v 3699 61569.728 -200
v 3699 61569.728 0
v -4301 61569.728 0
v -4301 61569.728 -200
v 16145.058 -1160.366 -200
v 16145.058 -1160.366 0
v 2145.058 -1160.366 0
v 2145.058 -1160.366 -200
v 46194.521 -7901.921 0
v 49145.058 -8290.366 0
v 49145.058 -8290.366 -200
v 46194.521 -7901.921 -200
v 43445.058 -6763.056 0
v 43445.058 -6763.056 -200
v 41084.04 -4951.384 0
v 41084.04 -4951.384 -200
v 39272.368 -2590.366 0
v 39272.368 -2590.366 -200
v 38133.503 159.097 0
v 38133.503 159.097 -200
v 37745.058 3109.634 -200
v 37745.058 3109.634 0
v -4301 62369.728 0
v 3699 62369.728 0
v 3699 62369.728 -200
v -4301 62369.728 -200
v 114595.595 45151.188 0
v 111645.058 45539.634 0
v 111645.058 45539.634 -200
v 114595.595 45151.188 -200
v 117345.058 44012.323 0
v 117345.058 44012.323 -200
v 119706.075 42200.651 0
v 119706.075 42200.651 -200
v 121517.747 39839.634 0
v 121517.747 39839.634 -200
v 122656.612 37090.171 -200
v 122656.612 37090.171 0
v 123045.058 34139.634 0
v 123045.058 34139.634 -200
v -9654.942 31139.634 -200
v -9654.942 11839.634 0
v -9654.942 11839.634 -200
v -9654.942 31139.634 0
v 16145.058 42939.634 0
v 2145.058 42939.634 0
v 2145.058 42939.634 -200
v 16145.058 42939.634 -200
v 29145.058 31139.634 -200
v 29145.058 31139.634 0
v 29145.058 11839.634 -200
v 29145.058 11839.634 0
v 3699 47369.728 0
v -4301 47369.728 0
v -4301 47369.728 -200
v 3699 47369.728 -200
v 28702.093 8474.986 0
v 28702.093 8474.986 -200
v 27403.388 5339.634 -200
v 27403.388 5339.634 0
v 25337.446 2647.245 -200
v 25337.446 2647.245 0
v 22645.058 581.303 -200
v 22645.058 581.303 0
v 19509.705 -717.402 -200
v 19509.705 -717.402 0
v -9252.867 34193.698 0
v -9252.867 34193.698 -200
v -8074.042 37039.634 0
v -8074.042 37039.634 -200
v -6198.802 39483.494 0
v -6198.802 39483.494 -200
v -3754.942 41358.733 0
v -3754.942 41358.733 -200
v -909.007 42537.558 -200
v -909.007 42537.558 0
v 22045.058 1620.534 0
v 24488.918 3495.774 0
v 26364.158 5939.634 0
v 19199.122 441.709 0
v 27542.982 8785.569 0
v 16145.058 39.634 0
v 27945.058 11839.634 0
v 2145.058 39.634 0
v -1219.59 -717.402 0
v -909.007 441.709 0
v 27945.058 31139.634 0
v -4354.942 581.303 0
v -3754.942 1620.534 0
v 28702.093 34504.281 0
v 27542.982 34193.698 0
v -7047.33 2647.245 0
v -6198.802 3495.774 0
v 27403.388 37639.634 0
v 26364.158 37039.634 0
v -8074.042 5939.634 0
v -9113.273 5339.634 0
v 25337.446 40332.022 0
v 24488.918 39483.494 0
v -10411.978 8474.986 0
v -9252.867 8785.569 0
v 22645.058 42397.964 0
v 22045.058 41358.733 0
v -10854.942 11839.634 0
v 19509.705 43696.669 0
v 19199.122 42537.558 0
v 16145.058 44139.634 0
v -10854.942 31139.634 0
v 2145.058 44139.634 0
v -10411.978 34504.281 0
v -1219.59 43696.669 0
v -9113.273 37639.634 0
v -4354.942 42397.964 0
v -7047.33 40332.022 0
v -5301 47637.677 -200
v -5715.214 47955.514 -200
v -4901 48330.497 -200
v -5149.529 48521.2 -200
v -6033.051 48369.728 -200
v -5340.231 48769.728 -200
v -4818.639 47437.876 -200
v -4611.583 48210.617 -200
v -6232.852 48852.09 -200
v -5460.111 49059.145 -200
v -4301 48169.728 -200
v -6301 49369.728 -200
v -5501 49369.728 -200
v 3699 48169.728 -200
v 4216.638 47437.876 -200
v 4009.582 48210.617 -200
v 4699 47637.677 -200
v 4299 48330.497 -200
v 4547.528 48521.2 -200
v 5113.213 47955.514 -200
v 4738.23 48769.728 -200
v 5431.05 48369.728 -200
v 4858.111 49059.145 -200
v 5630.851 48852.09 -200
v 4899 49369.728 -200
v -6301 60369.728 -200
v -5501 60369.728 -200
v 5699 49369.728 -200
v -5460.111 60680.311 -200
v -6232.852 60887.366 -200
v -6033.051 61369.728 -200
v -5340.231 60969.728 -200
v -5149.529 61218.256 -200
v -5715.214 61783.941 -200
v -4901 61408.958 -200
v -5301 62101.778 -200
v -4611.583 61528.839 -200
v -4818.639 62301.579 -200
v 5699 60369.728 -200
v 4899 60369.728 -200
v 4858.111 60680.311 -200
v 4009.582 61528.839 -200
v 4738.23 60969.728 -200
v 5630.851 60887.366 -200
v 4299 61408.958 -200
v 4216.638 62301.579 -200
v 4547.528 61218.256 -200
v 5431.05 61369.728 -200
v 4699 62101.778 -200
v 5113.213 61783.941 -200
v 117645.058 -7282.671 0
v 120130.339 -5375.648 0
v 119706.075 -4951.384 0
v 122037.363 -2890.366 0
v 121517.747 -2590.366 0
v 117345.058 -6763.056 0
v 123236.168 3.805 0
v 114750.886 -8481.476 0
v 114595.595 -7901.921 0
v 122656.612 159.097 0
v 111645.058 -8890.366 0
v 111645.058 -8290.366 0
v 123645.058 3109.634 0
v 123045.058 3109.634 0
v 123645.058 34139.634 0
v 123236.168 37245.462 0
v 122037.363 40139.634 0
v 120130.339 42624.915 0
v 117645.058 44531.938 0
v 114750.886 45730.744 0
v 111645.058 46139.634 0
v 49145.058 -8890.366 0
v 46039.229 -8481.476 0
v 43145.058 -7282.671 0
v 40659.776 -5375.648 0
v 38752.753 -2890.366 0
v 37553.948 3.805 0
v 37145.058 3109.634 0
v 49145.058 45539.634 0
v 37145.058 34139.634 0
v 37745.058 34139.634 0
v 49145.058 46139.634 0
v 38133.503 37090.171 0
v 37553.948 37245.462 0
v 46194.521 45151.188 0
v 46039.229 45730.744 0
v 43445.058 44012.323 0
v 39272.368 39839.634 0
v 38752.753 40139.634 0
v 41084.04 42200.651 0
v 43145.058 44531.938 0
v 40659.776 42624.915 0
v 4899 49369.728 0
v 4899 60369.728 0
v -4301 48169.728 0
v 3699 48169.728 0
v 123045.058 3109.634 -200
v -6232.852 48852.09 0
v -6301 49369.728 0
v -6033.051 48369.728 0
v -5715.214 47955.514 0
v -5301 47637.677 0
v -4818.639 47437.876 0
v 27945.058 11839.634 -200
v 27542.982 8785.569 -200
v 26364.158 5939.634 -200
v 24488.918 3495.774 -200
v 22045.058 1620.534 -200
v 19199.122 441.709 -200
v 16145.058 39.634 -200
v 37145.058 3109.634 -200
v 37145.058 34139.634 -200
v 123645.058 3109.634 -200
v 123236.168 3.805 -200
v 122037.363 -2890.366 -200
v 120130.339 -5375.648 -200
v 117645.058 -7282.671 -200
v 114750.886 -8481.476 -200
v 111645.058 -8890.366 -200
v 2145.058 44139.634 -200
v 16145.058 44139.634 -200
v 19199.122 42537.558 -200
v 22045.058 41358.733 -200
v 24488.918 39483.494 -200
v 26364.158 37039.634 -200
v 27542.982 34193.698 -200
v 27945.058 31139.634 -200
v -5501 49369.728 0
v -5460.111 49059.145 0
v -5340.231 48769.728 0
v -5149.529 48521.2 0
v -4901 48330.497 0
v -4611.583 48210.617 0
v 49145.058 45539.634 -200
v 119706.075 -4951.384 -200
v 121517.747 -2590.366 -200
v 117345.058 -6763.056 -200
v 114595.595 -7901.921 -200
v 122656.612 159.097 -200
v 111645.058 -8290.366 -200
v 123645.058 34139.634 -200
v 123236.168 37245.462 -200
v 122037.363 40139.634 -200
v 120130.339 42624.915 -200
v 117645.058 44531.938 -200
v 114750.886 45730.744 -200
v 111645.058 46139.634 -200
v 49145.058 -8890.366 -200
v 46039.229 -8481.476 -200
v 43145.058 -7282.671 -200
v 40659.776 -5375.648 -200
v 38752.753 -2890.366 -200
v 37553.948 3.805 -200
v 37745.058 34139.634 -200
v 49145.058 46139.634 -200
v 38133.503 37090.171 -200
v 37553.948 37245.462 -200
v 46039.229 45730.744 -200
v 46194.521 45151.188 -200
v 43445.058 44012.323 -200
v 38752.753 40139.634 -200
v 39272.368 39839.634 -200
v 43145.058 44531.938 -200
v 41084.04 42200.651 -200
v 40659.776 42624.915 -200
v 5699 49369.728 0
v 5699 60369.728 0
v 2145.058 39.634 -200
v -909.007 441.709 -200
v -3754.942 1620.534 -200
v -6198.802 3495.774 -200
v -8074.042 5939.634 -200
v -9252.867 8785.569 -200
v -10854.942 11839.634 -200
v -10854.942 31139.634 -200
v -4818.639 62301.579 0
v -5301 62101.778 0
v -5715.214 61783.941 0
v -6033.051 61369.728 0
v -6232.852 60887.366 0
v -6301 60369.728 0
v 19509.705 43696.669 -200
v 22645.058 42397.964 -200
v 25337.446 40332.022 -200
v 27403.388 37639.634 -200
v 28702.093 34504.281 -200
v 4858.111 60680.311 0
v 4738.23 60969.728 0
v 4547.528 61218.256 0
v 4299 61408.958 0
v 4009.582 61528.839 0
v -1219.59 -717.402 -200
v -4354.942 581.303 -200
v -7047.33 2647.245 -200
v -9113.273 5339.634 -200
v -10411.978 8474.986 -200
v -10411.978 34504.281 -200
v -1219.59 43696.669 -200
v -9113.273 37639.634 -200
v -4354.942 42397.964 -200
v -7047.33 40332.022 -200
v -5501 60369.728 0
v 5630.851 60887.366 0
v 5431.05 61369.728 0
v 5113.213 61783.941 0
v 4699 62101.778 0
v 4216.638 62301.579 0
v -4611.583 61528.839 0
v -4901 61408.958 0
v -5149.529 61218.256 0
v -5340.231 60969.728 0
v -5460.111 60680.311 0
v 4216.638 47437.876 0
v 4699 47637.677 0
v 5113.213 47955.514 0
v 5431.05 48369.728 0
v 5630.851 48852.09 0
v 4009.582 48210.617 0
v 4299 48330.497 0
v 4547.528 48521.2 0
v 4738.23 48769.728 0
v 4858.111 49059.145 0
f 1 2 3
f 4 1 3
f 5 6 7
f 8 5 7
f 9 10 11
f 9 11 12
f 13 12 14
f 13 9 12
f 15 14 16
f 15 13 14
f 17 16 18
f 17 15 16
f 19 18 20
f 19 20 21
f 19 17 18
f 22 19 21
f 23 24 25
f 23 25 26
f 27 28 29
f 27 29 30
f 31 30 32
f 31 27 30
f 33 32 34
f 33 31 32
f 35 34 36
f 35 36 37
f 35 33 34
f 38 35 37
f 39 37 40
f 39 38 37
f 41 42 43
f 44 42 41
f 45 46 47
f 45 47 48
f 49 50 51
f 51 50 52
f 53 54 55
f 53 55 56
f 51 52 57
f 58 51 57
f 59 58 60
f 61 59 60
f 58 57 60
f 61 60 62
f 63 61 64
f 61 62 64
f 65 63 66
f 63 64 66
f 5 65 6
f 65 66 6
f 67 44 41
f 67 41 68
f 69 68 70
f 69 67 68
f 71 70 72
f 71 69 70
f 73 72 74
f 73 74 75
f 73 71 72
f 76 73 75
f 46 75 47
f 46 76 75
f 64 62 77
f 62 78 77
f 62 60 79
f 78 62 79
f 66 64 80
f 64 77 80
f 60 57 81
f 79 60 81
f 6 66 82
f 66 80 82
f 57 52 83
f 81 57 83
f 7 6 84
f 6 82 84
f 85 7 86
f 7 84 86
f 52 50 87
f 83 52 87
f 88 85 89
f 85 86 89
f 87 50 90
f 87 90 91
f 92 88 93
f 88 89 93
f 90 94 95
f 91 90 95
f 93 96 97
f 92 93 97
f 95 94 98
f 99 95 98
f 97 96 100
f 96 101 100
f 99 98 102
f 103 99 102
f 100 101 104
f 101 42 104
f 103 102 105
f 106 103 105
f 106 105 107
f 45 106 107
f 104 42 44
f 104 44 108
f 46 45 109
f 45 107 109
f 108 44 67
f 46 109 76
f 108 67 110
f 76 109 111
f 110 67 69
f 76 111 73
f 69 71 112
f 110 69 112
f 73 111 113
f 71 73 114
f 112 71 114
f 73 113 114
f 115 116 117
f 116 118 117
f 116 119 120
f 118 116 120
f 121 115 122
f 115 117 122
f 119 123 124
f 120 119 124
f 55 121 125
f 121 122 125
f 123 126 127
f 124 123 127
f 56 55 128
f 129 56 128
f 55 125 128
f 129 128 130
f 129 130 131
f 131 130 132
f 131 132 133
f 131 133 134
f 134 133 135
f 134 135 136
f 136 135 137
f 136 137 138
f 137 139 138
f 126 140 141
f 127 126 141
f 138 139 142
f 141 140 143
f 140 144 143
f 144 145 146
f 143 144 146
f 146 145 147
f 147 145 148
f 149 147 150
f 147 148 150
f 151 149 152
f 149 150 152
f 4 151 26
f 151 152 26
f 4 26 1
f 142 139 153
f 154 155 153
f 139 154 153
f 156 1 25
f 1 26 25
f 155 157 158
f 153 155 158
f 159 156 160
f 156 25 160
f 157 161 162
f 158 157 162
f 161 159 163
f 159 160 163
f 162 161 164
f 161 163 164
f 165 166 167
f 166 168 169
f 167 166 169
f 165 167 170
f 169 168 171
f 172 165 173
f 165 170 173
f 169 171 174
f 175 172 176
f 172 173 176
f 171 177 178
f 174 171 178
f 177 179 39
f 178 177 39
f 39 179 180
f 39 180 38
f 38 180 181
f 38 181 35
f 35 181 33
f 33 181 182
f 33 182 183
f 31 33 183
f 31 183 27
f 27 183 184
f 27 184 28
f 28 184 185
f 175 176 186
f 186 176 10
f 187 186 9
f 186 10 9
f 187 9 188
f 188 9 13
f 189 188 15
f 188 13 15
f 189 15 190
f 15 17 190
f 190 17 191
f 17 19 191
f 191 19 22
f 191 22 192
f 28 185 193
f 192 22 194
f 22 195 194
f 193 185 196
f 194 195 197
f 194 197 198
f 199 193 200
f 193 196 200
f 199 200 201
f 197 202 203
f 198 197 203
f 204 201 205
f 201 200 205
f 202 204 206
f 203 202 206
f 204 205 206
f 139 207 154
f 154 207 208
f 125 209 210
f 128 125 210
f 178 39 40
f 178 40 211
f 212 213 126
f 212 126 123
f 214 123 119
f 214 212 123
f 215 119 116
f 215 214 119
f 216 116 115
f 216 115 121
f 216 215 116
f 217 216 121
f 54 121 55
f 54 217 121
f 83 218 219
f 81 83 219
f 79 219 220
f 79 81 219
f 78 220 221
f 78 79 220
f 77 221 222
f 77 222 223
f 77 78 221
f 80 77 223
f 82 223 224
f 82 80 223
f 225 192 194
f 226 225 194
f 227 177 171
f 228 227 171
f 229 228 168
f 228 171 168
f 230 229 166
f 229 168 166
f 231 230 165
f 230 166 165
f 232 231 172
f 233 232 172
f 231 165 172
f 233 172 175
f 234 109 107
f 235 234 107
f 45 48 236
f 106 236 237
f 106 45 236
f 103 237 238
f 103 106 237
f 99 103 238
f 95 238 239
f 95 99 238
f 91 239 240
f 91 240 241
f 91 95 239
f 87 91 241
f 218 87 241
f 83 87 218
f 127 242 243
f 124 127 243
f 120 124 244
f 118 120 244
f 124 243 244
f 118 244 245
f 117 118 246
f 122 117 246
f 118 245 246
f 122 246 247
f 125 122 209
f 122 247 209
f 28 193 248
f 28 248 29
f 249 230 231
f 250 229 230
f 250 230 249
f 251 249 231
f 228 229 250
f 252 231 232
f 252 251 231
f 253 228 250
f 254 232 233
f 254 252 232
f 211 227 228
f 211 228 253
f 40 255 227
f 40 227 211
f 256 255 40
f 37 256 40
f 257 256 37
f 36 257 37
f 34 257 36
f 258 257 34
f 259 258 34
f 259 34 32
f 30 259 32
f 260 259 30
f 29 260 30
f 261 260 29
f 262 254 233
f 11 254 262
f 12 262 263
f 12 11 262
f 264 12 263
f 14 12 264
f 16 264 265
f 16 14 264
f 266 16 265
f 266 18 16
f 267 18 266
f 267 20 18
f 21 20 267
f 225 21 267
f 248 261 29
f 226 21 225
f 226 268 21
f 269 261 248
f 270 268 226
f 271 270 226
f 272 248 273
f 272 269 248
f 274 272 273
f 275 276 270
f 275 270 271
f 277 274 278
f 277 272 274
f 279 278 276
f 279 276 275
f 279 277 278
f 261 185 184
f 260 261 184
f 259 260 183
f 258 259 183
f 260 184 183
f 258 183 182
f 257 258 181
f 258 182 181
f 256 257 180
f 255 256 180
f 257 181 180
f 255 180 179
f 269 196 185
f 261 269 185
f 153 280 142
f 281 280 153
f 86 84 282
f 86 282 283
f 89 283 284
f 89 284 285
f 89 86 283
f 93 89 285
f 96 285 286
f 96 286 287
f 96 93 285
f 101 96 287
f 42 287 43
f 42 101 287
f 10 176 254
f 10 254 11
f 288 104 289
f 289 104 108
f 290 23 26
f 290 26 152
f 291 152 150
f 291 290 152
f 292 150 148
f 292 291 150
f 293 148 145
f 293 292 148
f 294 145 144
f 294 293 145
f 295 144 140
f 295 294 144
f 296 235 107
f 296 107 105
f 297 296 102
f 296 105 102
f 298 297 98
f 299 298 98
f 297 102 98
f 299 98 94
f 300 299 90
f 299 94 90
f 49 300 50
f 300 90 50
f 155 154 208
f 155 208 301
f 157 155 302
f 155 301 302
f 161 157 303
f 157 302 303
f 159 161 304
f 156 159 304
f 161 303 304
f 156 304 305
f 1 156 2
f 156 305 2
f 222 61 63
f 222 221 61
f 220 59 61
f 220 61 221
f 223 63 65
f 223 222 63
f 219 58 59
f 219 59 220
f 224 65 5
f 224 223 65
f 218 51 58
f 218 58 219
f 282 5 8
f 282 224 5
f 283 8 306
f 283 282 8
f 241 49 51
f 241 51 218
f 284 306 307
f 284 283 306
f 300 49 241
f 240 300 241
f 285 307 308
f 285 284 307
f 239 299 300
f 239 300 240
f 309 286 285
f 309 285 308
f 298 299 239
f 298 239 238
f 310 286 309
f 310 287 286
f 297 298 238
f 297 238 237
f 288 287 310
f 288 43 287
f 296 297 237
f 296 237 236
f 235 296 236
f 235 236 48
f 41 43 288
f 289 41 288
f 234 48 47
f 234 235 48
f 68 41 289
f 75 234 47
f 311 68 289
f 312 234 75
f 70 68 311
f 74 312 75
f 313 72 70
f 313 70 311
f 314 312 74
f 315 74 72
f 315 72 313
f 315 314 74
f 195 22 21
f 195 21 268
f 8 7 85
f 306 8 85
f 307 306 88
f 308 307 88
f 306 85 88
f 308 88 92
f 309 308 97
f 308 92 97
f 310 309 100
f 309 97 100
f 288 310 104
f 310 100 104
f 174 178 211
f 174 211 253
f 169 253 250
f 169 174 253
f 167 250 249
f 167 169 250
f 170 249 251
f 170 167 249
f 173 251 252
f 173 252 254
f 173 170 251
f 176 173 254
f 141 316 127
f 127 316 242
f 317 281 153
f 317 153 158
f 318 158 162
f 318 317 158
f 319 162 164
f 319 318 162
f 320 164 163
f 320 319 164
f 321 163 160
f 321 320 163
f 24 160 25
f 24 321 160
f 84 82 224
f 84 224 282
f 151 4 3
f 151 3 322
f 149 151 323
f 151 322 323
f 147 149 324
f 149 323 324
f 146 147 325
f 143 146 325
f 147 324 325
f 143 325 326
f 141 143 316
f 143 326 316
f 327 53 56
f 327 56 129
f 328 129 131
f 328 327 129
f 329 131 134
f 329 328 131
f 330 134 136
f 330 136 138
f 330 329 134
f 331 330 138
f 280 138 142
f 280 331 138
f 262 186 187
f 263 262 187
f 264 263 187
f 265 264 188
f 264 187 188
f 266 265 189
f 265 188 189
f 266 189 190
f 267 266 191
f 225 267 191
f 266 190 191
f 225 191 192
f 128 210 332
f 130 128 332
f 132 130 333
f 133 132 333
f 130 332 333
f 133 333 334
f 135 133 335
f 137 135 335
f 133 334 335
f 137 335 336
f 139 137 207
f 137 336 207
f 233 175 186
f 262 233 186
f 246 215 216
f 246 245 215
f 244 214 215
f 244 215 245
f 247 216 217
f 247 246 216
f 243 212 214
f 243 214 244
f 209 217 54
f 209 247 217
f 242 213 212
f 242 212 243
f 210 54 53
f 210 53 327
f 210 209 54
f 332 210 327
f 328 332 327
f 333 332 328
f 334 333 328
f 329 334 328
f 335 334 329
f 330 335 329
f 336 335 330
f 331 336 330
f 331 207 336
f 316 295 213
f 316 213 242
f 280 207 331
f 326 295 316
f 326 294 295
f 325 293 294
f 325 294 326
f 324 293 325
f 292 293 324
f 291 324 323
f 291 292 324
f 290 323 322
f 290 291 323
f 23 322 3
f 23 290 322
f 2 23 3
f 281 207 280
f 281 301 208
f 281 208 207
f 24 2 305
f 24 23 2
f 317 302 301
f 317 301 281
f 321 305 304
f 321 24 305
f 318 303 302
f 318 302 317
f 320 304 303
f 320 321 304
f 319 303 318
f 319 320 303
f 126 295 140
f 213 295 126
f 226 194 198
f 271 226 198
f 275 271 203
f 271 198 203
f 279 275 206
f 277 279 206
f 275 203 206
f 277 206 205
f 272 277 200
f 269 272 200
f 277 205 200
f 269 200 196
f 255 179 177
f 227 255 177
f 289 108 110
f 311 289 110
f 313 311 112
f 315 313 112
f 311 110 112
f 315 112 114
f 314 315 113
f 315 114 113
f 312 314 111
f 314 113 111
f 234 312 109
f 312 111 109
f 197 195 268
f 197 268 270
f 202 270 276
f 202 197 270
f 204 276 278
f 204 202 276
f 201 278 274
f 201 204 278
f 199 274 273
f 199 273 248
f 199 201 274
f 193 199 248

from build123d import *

# Parameters (mm, degrees)
EXTRUDE1_DEPTH   = 200
EXTRUDE1_2_DEPTH = 200
EXTRUDE1_3_DEPTH = 200


with BuildPart() as part:
    # Sketch1 → Extrude1 (new body)
    with BuildSketch(Plane.XY):
        with BuildLine():
            Line((49145.057737679, 46139.633625626), (111645.057737679, 46139.633625626))
            ThreePointArc((111645.057737679, 46139.633625626), (120130.339111917, 42624.914999864), (123645.057737679, 34139.633625626))
            Line((123645.057737679, 34139.633625626), (123645.057737679, 3109.633625626))
            ThreePointArc((123645.057737679, 3109.633625626), (120130.339111917, -5375.647748613), (111645.057737679, -8890.366374374))
            Line((111645.057737679, -8890.366374374), (49145.057737679, -8890.366374374))
            ThreePointArc((49145.057737679, -8890.366374374), (40659.77636344, -5375.647748613), (37145.057737679, 3109.633625626))
            Line((37145.057737679, 3109.633625626), (37145.057737679, 34139.633625626))
            ThreePointArc((37145.057737679, 34139.633625626), (40659.77636344, 42624.914999864), (49145.057737679, 46139.633625626))
        make_face()
        with BuildLine():
            Line((123045.057737679, 34139.633625626), (123045.057737679, 3109.633625626))
            ThreePointArc((123045.057737679, 3109.633625626), (119706.075043205, -4951.383679901), (111645.057737679, -8290.366374374))
            Line((111645.057737679, -8290.366374374), (49145.057737679, -8290.366374374))
            ThreePointArc((49145.057737679, -8290.366374374), (41084.040432152, -4951.383679901), (37745.057737679, 3109.633625626))
            Line((37745.057737679, 3109.633625626), (37745.057737679, 34139.633625626))
            ThreePointArc((37745.057737679, 34139.633625626), (41084.040432152, 42200.650931152), (49145.057737679, 45539.633625626))
            Line((49145.057737679, 45539.633625626), (111645.057737679, 45539.633625626))
            ThreePointArc((111645.057737679, 45539.633625626), (119706.075043205, 42200.650931152), (123045.057737679, 34139.633625626))
        make_face(mode=Mode.SUBTRACT)
    extrude(amount=-EXTRUDE1_DEPTH)


with BuildPart() as body_2:
    # Sketch1 → Extrude1 2 (new body)
    with BuildSketch(Plane.XY):
        with BuildLine():
            Line((2145.057737679, 44139.633625626), (16145.057737679, 44139.633625626))
            ThreePointArc((16145.057737679, 44139.633625626), (25337.445893104, 40332.021781051), (29145.057737679, 31139.633625626))
            Line((29145.057737679, 31139.633625626), (29145.057737679, 11839.633625626))
            ThreePointArc((29145.057737679, 11839.633625626), (25337.445893104, 2647.245470201), (16145.057737679, -1160.366374374))
            Line((16145.057737679, -1160.366374374), (2145.057737679, -1160.366374374))
            ThreePointArc((2145.057737679, -1160.366374374), (-7047.330417747, 2647.245470201), (-10854.942262321, 11839.633625626))
            Line((-10854.942262321, 11839.633625626), (-10854.942262321, 31139.633625626))
            ThreePointArc((-10854.942262321, 31139.633625626), (-7047.330417747, 40332.021781051), (2145.057737679, 44139.633625626))
        make_face()
        with BuildLine():
            Line((27945.057737679, 31139.633625626), (27945.057737679, 11839.633625626))
            ThreePointArc((27945.057737679, 11839.633625626), (24488.91775568, 3495.773607624), (16145.057737679, 39.633625626))
            Line((16145.057737679, 39.633625626), (2145.057737679, 39.633625626))
            ThreePointArc((2145.057737679, 39.633625626), (-6198.802280323, 3495.773607624), (-9654.942262321, 11839.633625626))
            Line((-9654.942262321, 11839.633625626), (-9654.942262321, 31139.633625626))
            ThreePointArc((-9654.942262321, 31139.633625626), (-6198.802280323, 39483.493643627), (2145.057737679, 42939.633625626))
            Line((2145.057737679, 42939.633625626), (16145.057737679, 42939.633625626))
            ThreePointArc((16145.057737679, 42939.633625626), (24488.91775568, 39483.493643627), (27945.057737679, 31139.633625626))
        make_face(mode=Mode.SUBTRACT)
    extrude(amount=-EXTRUDE1_2_DEPTH)


with BuildPart() as body_3:
    # Sketch1 → Extrude1 3 (new body)
    with BuildSketch(Plane.XY):
        with BuildLine():
            Line((3698.999542599, 62369.727650707), (-4301.000457401, 62369.727650707))
            ThreePointArc((-4301.000457401, 62369.727650707), (-5715.214019774, 61783.941213081), (-6301.000457401, 60369.727650707))
            Line((-6301.000457401, 60369.727650707), (-6301.000457401, 49369.727650707))
            ThreePointArc((-6301.000457401, 49369.727650707), (-5715.214019774, 47955.514088334), (-4301.000457401, 47369.727650707))
            Line((-4301.000457401, 47369.727650707), (3698.999542599, 47369.727650707))
            ThreePointArc((3698.999542599, 47369.727650707), (5113.213104972, 47955.514088334), (5698.999542599, 49369.727650707))
            Line((5698.999542599, 49369.727650707), (5698.999542599, 60369.727650707))
            ThreePointArc((5698.999542599, 60369.727650707), (5113.213104972, 61783.941213081), (3698.999542599, 62369.727650707))
        make_face()
        with BuildLine():
            Line((-5501.000457401, 60369.727650707), (-5501.000457401, 49369.727650707))
            ThreePointArc((-5501.000457401, 49369.727650707), (-5149.528594825, 48521.199513284), (-4301.000457401, 48169.727650707))
            Line((-4301.000457401, 48169.727650707), (3698.999542599, 48169.727650707))
            ThreePointArc((3698.999542599, 48169.727650707), (4547.527680023, 48521.199513284), (4898.999542599, 49369.727650707))
            Line((4898.999542599, 49369.727650707), (4898.999542599, 60369.727650707))
            ThreePointArc((4898.999542599, 60369.727650707), (4547.527680023, 61218.255788131), (3698.999542599, 61569.727650707))
            Line((3698.999542599, 61569.727650707), (-4301.000457401, 61569.727650707))
            ThreePointArc((-4301.000457401, 61569.727650707), (-5149.528594825, 61218.255788131), (-5501.000457401, 60369.727650707))
        make_face(mode=Mode.SUBTRACT)
    extrude(amount=-EXTRUDE1_3_DEPTH)


solid = Compound([part.part, body_2.part, body_3.part])
